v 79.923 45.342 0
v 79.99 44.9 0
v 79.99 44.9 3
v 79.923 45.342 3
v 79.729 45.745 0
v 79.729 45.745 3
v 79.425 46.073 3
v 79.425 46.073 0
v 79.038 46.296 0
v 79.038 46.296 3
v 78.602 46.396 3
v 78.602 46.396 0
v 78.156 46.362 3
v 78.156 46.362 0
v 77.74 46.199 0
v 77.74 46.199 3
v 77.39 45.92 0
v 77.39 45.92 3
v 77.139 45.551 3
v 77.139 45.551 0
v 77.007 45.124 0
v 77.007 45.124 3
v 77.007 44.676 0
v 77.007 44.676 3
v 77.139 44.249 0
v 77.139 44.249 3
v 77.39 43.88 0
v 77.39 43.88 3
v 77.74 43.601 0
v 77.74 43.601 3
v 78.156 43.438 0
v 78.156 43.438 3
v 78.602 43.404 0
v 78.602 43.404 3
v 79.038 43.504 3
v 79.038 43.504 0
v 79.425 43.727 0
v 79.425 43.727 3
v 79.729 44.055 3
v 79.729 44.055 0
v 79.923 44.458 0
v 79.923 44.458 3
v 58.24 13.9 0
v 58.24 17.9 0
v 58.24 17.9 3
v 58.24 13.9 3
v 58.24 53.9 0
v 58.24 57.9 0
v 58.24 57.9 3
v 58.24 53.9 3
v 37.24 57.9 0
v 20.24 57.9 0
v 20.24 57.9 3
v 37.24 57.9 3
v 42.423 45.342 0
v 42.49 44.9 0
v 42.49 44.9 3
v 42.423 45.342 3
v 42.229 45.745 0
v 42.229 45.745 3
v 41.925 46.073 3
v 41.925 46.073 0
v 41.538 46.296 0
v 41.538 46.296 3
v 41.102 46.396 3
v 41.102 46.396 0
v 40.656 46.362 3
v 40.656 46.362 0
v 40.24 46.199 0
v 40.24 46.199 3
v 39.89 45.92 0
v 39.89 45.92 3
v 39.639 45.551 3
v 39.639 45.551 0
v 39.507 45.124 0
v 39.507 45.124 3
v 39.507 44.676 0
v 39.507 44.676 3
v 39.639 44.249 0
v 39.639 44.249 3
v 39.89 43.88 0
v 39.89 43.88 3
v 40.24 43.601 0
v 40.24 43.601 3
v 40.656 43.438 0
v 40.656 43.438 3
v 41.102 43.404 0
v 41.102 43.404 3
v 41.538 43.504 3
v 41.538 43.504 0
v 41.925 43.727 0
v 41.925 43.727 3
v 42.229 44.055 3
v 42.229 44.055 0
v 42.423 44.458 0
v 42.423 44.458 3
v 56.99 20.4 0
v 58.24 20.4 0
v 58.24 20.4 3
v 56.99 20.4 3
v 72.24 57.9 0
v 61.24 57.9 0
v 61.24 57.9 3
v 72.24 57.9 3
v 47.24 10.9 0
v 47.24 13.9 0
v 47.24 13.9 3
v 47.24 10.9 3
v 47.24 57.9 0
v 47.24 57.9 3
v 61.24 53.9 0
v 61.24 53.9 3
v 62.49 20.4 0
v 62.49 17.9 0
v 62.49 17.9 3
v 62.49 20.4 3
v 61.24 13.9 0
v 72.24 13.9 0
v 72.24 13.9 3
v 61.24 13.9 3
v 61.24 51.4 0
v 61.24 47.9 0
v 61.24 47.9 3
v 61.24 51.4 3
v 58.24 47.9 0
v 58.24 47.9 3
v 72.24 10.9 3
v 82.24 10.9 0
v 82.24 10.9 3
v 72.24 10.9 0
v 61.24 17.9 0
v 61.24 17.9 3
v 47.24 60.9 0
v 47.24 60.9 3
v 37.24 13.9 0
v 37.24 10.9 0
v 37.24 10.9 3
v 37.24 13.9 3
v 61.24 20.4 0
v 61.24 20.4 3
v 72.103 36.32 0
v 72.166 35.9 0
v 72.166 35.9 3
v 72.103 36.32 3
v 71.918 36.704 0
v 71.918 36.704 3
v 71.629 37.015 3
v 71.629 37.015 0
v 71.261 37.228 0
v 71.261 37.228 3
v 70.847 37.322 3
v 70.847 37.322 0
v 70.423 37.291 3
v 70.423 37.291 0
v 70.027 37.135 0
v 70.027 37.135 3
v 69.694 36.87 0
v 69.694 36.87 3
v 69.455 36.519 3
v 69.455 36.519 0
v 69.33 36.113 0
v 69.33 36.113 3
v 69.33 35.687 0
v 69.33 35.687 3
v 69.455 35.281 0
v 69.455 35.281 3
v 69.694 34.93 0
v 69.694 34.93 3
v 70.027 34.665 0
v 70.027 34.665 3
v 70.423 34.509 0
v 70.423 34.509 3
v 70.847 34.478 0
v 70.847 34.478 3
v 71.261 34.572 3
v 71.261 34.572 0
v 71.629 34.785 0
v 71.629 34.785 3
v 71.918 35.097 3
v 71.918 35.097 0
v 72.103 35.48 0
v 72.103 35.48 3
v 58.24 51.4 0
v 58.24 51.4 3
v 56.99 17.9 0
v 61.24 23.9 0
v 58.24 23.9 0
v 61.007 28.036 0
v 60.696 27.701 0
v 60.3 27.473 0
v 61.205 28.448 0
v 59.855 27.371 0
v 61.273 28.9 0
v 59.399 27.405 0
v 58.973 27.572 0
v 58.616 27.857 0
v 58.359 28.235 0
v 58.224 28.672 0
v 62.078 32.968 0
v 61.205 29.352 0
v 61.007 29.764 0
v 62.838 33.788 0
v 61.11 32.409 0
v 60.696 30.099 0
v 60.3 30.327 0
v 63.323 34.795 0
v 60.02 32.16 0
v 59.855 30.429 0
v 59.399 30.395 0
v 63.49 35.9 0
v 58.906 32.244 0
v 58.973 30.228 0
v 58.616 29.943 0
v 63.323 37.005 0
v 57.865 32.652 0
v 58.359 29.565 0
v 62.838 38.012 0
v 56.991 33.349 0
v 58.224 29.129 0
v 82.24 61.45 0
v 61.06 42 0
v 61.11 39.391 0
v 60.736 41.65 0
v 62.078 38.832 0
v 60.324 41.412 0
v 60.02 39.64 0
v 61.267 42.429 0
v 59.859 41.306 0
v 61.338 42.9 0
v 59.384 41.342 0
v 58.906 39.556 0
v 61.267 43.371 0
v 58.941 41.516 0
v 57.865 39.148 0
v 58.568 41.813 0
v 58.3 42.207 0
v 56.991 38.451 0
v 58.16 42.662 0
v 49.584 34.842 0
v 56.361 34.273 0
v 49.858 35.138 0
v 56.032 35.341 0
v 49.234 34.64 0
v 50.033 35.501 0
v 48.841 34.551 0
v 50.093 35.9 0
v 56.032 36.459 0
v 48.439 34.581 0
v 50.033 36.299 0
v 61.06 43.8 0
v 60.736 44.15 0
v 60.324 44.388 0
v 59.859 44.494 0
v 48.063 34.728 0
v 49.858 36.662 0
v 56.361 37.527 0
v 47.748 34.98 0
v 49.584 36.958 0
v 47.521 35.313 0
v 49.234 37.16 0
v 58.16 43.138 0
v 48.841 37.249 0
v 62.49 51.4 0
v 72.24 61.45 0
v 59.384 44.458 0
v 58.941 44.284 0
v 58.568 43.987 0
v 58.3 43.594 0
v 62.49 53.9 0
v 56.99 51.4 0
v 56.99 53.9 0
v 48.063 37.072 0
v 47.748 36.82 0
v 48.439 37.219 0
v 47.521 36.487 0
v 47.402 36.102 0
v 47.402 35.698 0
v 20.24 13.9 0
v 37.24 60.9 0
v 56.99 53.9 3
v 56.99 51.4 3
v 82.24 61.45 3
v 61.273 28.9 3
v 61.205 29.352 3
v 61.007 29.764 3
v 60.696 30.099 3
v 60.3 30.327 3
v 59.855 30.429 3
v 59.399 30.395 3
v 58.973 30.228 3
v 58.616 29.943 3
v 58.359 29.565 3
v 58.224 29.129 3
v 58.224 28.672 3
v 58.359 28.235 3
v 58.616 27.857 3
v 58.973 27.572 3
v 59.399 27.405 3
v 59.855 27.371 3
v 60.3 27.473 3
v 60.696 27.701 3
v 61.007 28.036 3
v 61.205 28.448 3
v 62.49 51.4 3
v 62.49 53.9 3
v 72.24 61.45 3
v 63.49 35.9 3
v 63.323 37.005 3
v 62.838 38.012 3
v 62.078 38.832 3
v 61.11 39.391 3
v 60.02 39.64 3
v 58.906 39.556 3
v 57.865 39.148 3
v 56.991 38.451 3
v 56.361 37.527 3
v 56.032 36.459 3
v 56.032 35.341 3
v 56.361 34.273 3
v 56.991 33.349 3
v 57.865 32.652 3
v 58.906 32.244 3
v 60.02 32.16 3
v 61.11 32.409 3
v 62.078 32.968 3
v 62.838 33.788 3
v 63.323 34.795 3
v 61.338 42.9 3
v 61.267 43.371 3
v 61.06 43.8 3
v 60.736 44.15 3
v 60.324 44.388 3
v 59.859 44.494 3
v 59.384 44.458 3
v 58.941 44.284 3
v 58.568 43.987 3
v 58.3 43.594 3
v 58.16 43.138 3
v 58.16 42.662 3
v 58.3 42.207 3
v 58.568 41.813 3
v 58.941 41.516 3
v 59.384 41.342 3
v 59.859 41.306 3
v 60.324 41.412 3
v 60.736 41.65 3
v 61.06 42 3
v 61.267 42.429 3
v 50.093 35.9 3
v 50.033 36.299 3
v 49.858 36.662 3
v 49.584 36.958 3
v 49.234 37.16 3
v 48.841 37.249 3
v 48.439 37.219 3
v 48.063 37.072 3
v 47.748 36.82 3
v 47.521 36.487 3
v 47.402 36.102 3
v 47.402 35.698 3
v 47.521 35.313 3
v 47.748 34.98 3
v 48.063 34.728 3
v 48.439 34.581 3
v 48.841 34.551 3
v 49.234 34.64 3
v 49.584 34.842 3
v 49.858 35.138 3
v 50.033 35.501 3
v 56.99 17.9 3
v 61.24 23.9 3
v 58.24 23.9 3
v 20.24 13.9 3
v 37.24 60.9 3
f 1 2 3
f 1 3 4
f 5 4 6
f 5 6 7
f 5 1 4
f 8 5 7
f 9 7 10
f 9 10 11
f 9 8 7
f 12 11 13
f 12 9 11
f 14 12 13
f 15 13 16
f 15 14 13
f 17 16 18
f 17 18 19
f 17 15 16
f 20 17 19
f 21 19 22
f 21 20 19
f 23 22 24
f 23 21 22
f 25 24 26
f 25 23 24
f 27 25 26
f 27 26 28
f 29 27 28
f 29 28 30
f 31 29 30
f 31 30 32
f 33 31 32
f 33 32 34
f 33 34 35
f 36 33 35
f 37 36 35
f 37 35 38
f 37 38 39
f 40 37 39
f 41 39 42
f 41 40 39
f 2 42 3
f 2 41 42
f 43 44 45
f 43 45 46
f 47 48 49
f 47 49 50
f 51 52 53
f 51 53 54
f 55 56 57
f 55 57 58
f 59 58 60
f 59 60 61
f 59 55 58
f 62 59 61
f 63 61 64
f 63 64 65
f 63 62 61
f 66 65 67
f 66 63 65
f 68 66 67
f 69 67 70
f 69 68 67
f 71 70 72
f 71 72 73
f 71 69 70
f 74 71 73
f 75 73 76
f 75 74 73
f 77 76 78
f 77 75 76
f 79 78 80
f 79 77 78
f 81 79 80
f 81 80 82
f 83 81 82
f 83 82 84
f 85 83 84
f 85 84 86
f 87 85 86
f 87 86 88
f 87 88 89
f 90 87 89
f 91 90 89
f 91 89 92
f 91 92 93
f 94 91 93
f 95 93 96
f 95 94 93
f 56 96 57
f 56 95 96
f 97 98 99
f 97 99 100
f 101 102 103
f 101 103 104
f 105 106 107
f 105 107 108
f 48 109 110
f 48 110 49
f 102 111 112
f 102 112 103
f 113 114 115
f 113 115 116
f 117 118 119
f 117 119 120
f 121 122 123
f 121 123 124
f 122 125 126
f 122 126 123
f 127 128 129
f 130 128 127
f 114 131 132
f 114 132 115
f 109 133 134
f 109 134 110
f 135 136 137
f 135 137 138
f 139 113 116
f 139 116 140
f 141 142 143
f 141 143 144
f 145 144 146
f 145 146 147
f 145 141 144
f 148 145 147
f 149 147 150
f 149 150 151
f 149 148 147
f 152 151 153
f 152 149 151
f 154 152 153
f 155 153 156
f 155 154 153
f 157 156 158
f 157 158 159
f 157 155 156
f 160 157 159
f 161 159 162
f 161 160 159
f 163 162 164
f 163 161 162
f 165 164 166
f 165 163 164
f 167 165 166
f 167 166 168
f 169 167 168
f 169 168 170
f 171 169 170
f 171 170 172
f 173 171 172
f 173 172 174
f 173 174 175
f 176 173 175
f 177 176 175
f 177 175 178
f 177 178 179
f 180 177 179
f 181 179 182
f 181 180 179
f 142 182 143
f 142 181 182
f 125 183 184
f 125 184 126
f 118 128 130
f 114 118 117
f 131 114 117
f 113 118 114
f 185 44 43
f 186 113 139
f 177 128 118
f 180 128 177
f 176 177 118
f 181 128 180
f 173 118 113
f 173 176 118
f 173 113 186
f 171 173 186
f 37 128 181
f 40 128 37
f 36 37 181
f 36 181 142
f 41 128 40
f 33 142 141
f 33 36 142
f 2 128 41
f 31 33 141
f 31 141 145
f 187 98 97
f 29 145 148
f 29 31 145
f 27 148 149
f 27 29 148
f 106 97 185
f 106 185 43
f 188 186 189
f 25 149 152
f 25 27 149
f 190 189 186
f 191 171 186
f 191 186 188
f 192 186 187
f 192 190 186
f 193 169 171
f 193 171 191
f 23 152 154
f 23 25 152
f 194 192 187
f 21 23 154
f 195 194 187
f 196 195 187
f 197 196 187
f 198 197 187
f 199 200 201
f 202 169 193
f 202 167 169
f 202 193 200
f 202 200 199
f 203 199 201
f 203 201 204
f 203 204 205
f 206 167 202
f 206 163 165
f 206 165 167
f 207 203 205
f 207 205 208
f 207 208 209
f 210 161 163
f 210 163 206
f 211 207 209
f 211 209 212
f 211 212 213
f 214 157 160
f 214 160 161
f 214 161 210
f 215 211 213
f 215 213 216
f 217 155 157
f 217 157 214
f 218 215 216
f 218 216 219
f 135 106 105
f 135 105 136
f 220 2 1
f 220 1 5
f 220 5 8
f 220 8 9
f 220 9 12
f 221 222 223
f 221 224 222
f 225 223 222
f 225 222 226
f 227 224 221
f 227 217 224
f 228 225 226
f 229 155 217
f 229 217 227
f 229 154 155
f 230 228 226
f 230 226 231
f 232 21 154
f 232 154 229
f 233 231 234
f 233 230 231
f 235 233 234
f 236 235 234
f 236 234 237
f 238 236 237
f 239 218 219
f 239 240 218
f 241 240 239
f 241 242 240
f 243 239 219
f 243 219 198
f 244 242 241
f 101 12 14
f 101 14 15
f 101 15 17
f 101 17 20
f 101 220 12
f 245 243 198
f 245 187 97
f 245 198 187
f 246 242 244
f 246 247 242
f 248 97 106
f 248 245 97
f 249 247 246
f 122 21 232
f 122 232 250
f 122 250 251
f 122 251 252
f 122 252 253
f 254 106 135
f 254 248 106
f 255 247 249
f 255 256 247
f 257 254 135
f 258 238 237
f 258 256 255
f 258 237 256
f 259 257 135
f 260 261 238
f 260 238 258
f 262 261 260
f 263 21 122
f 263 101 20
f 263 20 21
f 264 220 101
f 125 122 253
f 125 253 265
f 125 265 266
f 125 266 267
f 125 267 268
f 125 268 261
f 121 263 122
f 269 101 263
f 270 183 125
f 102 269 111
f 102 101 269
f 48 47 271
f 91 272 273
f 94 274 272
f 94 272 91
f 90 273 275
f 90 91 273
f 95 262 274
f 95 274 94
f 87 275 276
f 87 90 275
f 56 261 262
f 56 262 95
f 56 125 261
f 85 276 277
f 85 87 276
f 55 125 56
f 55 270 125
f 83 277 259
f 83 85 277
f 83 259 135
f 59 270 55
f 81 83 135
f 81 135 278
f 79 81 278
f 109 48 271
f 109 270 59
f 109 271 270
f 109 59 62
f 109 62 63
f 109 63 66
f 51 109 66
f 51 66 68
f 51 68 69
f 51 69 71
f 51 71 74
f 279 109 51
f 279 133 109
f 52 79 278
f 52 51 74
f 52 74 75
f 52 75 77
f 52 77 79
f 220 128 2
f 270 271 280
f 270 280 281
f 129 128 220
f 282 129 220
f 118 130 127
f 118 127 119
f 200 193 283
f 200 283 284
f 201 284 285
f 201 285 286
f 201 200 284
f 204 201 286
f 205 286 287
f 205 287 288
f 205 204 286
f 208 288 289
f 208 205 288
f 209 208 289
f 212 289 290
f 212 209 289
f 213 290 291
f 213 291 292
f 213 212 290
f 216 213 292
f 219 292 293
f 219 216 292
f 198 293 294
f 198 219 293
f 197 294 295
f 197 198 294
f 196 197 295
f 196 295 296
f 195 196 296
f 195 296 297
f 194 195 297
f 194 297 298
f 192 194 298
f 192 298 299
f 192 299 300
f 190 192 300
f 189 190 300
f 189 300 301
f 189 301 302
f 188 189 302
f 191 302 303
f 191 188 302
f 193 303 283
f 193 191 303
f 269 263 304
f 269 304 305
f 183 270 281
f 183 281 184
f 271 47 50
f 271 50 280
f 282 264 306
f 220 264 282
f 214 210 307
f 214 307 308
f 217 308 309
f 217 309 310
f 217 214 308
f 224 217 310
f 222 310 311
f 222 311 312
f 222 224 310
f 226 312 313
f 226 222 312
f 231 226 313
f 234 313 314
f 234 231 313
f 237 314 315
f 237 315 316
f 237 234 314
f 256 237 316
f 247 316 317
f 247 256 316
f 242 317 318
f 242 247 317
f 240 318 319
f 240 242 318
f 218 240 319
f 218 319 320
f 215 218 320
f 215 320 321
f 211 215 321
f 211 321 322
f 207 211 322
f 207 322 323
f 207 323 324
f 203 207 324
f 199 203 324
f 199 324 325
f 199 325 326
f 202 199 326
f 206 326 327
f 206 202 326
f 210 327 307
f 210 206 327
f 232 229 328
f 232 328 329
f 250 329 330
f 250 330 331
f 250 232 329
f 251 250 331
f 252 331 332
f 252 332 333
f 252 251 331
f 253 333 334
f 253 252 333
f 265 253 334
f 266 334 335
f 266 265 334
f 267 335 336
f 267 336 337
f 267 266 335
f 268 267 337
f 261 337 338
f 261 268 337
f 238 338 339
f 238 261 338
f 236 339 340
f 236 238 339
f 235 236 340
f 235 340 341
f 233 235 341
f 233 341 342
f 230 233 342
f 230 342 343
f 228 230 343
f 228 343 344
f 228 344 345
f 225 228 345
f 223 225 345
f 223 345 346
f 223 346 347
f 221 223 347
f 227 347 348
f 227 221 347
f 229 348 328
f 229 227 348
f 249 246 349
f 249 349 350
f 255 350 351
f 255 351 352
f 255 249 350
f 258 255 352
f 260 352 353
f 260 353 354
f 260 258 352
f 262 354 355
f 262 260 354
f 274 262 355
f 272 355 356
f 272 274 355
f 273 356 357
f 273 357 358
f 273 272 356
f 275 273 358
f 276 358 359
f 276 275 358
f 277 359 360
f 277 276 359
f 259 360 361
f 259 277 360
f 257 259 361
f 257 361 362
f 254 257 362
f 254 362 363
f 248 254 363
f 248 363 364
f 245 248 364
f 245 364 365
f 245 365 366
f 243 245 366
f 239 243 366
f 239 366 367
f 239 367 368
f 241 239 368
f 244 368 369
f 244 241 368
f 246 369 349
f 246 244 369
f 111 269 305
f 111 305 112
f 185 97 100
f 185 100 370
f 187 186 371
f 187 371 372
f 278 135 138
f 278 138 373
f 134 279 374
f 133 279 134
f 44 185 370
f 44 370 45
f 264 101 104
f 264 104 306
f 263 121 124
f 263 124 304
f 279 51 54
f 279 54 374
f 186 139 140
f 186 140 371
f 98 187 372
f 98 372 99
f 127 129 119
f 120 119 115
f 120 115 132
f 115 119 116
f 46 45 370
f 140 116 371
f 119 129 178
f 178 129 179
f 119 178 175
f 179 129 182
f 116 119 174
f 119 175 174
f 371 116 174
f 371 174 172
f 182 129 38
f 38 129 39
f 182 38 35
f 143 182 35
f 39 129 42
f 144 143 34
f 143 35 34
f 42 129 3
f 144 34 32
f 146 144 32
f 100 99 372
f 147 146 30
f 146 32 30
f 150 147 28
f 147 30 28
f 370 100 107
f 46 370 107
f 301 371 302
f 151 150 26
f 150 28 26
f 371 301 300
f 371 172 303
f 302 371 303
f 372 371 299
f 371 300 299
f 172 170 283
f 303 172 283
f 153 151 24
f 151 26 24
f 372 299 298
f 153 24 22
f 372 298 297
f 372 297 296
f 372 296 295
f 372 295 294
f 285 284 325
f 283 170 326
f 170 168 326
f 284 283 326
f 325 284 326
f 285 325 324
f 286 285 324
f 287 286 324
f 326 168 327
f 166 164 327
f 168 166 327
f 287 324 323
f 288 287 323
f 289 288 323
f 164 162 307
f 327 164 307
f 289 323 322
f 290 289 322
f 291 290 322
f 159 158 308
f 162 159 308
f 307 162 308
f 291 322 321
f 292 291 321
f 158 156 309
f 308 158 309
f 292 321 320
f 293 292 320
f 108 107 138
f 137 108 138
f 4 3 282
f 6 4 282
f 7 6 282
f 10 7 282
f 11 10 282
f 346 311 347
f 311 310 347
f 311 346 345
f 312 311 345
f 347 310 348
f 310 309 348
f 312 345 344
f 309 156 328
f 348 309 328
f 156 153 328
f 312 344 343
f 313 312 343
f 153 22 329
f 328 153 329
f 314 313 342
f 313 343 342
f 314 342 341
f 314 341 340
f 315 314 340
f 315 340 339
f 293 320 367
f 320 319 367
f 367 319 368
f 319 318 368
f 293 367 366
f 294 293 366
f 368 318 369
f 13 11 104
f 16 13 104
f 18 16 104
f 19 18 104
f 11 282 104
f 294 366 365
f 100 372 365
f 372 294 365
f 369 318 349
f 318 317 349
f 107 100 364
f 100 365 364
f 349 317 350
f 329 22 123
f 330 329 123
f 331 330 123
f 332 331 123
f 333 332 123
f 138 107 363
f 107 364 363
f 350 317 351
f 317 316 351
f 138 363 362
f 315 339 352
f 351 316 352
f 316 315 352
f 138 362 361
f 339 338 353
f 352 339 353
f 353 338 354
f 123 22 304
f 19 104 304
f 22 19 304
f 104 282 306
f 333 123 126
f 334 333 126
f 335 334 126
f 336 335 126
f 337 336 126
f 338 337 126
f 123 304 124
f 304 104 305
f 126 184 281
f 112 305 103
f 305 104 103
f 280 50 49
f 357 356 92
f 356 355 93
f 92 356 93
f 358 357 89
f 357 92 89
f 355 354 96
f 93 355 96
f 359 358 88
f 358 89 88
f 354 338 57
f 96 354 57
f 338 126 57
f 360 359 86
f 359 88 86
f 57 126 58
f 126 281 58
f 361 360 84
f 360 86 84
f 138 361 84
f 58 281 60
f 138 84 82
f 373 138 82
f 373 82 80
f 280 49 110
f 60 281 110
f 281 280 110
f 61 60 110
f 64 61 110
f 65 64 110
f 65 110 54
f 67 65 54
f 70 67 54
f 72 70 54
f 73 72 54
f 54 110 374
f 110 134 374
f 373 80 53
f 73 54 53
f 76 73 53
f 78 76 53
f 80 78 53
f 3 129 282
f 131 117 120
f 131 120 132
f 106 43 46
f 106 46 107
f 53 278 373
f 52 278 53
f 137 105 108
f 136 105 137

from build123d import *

# Parameters (mm, degrees)
MODEL_R             = 3.750000001
MODEL_R_2           = 1.500000002
MODEL_R_3           = 1.353150001
MODEL_R_4           = 1.598250001
MODEL_R_5           = 1.533250001
MODEL_R_6           = 1.426350001
BOSS_EXTRUDE1_DEPTH = 3


with BuildPart() as part:
    # Model → Boss-Extrude1 (new body)
    with BuildSketch(Plane.XY):
        Polygon((58.24, 47.9), (61.24, 47.9), (61.24, 51.4001), (62.49, 51.4001), (62.49, 53.9001), (61.24, 53.9001), (61.24, 57.9), (72.24, 57.9), (72.24, 61.449728443), (82.24, 61.449728443), (82.24, 57.9), (82.24, 13.9), (82.24, 10.9), (72.24, 10.9), (72.24, 13.9), (61.24, 13.9), (61.24, 17.9), (62.49, 17.9), (62.49, 20.4), (61.24, 20.4), (61.24, 23.9), (58.24, 23.9), (58.24, 20.4), (56.99, 20.4), (56.99, 17.9), (58.24, 17.9), (58.24, 13.9), (47.24, 13.9), (47.24, 10.9), (37.24, 10.9), (37.24, 13.9), (20.24, 13.9), (20.24, 57.9), (37.24, 57.9), (37.24, 60.9), (47.24, 60.9), (47.24, 57.9), (58.24, 57.9), (58.24, 53.9001), (56.99, 53.9001), (56.99, 51.4001), (58.24, 51.4001), align=None)
        with Locations((59.739999999, 35.899999999)):
            Circle(MODEL_R, mode=Mode.SUBTRACT)
        with Locations((40.989999998, 44.899999998)):
            Circle(MODEL_R_2, mode=Mode.SUBTRACT)
        with Locations((48.73995, 35.90005)):
            Circle(MODEL_R_3, mode=Mode.SUBTRACT)
        with Locations((59.73995, 42.90005)):
            Circle(MODEL_R_4, mode=Mode.SUBTRACT)
        with Locations((59.73995, 28.90005)):
            Circle(MODEL_R_5, mode=Mode.SUBTRACT)
        with Locations((70.73995, 35.90005)):
            Circle(MODEL_R_6, mode=Mode.SUBTRACT)
        with Locations((78.489999998, 44.899999998)):
            Circle(MODEL_R_2, mode=Mode.SUBTRACT)
    extrude(amount=BOSS_EXTRUDE1_DEPTH)


solid = part.part
